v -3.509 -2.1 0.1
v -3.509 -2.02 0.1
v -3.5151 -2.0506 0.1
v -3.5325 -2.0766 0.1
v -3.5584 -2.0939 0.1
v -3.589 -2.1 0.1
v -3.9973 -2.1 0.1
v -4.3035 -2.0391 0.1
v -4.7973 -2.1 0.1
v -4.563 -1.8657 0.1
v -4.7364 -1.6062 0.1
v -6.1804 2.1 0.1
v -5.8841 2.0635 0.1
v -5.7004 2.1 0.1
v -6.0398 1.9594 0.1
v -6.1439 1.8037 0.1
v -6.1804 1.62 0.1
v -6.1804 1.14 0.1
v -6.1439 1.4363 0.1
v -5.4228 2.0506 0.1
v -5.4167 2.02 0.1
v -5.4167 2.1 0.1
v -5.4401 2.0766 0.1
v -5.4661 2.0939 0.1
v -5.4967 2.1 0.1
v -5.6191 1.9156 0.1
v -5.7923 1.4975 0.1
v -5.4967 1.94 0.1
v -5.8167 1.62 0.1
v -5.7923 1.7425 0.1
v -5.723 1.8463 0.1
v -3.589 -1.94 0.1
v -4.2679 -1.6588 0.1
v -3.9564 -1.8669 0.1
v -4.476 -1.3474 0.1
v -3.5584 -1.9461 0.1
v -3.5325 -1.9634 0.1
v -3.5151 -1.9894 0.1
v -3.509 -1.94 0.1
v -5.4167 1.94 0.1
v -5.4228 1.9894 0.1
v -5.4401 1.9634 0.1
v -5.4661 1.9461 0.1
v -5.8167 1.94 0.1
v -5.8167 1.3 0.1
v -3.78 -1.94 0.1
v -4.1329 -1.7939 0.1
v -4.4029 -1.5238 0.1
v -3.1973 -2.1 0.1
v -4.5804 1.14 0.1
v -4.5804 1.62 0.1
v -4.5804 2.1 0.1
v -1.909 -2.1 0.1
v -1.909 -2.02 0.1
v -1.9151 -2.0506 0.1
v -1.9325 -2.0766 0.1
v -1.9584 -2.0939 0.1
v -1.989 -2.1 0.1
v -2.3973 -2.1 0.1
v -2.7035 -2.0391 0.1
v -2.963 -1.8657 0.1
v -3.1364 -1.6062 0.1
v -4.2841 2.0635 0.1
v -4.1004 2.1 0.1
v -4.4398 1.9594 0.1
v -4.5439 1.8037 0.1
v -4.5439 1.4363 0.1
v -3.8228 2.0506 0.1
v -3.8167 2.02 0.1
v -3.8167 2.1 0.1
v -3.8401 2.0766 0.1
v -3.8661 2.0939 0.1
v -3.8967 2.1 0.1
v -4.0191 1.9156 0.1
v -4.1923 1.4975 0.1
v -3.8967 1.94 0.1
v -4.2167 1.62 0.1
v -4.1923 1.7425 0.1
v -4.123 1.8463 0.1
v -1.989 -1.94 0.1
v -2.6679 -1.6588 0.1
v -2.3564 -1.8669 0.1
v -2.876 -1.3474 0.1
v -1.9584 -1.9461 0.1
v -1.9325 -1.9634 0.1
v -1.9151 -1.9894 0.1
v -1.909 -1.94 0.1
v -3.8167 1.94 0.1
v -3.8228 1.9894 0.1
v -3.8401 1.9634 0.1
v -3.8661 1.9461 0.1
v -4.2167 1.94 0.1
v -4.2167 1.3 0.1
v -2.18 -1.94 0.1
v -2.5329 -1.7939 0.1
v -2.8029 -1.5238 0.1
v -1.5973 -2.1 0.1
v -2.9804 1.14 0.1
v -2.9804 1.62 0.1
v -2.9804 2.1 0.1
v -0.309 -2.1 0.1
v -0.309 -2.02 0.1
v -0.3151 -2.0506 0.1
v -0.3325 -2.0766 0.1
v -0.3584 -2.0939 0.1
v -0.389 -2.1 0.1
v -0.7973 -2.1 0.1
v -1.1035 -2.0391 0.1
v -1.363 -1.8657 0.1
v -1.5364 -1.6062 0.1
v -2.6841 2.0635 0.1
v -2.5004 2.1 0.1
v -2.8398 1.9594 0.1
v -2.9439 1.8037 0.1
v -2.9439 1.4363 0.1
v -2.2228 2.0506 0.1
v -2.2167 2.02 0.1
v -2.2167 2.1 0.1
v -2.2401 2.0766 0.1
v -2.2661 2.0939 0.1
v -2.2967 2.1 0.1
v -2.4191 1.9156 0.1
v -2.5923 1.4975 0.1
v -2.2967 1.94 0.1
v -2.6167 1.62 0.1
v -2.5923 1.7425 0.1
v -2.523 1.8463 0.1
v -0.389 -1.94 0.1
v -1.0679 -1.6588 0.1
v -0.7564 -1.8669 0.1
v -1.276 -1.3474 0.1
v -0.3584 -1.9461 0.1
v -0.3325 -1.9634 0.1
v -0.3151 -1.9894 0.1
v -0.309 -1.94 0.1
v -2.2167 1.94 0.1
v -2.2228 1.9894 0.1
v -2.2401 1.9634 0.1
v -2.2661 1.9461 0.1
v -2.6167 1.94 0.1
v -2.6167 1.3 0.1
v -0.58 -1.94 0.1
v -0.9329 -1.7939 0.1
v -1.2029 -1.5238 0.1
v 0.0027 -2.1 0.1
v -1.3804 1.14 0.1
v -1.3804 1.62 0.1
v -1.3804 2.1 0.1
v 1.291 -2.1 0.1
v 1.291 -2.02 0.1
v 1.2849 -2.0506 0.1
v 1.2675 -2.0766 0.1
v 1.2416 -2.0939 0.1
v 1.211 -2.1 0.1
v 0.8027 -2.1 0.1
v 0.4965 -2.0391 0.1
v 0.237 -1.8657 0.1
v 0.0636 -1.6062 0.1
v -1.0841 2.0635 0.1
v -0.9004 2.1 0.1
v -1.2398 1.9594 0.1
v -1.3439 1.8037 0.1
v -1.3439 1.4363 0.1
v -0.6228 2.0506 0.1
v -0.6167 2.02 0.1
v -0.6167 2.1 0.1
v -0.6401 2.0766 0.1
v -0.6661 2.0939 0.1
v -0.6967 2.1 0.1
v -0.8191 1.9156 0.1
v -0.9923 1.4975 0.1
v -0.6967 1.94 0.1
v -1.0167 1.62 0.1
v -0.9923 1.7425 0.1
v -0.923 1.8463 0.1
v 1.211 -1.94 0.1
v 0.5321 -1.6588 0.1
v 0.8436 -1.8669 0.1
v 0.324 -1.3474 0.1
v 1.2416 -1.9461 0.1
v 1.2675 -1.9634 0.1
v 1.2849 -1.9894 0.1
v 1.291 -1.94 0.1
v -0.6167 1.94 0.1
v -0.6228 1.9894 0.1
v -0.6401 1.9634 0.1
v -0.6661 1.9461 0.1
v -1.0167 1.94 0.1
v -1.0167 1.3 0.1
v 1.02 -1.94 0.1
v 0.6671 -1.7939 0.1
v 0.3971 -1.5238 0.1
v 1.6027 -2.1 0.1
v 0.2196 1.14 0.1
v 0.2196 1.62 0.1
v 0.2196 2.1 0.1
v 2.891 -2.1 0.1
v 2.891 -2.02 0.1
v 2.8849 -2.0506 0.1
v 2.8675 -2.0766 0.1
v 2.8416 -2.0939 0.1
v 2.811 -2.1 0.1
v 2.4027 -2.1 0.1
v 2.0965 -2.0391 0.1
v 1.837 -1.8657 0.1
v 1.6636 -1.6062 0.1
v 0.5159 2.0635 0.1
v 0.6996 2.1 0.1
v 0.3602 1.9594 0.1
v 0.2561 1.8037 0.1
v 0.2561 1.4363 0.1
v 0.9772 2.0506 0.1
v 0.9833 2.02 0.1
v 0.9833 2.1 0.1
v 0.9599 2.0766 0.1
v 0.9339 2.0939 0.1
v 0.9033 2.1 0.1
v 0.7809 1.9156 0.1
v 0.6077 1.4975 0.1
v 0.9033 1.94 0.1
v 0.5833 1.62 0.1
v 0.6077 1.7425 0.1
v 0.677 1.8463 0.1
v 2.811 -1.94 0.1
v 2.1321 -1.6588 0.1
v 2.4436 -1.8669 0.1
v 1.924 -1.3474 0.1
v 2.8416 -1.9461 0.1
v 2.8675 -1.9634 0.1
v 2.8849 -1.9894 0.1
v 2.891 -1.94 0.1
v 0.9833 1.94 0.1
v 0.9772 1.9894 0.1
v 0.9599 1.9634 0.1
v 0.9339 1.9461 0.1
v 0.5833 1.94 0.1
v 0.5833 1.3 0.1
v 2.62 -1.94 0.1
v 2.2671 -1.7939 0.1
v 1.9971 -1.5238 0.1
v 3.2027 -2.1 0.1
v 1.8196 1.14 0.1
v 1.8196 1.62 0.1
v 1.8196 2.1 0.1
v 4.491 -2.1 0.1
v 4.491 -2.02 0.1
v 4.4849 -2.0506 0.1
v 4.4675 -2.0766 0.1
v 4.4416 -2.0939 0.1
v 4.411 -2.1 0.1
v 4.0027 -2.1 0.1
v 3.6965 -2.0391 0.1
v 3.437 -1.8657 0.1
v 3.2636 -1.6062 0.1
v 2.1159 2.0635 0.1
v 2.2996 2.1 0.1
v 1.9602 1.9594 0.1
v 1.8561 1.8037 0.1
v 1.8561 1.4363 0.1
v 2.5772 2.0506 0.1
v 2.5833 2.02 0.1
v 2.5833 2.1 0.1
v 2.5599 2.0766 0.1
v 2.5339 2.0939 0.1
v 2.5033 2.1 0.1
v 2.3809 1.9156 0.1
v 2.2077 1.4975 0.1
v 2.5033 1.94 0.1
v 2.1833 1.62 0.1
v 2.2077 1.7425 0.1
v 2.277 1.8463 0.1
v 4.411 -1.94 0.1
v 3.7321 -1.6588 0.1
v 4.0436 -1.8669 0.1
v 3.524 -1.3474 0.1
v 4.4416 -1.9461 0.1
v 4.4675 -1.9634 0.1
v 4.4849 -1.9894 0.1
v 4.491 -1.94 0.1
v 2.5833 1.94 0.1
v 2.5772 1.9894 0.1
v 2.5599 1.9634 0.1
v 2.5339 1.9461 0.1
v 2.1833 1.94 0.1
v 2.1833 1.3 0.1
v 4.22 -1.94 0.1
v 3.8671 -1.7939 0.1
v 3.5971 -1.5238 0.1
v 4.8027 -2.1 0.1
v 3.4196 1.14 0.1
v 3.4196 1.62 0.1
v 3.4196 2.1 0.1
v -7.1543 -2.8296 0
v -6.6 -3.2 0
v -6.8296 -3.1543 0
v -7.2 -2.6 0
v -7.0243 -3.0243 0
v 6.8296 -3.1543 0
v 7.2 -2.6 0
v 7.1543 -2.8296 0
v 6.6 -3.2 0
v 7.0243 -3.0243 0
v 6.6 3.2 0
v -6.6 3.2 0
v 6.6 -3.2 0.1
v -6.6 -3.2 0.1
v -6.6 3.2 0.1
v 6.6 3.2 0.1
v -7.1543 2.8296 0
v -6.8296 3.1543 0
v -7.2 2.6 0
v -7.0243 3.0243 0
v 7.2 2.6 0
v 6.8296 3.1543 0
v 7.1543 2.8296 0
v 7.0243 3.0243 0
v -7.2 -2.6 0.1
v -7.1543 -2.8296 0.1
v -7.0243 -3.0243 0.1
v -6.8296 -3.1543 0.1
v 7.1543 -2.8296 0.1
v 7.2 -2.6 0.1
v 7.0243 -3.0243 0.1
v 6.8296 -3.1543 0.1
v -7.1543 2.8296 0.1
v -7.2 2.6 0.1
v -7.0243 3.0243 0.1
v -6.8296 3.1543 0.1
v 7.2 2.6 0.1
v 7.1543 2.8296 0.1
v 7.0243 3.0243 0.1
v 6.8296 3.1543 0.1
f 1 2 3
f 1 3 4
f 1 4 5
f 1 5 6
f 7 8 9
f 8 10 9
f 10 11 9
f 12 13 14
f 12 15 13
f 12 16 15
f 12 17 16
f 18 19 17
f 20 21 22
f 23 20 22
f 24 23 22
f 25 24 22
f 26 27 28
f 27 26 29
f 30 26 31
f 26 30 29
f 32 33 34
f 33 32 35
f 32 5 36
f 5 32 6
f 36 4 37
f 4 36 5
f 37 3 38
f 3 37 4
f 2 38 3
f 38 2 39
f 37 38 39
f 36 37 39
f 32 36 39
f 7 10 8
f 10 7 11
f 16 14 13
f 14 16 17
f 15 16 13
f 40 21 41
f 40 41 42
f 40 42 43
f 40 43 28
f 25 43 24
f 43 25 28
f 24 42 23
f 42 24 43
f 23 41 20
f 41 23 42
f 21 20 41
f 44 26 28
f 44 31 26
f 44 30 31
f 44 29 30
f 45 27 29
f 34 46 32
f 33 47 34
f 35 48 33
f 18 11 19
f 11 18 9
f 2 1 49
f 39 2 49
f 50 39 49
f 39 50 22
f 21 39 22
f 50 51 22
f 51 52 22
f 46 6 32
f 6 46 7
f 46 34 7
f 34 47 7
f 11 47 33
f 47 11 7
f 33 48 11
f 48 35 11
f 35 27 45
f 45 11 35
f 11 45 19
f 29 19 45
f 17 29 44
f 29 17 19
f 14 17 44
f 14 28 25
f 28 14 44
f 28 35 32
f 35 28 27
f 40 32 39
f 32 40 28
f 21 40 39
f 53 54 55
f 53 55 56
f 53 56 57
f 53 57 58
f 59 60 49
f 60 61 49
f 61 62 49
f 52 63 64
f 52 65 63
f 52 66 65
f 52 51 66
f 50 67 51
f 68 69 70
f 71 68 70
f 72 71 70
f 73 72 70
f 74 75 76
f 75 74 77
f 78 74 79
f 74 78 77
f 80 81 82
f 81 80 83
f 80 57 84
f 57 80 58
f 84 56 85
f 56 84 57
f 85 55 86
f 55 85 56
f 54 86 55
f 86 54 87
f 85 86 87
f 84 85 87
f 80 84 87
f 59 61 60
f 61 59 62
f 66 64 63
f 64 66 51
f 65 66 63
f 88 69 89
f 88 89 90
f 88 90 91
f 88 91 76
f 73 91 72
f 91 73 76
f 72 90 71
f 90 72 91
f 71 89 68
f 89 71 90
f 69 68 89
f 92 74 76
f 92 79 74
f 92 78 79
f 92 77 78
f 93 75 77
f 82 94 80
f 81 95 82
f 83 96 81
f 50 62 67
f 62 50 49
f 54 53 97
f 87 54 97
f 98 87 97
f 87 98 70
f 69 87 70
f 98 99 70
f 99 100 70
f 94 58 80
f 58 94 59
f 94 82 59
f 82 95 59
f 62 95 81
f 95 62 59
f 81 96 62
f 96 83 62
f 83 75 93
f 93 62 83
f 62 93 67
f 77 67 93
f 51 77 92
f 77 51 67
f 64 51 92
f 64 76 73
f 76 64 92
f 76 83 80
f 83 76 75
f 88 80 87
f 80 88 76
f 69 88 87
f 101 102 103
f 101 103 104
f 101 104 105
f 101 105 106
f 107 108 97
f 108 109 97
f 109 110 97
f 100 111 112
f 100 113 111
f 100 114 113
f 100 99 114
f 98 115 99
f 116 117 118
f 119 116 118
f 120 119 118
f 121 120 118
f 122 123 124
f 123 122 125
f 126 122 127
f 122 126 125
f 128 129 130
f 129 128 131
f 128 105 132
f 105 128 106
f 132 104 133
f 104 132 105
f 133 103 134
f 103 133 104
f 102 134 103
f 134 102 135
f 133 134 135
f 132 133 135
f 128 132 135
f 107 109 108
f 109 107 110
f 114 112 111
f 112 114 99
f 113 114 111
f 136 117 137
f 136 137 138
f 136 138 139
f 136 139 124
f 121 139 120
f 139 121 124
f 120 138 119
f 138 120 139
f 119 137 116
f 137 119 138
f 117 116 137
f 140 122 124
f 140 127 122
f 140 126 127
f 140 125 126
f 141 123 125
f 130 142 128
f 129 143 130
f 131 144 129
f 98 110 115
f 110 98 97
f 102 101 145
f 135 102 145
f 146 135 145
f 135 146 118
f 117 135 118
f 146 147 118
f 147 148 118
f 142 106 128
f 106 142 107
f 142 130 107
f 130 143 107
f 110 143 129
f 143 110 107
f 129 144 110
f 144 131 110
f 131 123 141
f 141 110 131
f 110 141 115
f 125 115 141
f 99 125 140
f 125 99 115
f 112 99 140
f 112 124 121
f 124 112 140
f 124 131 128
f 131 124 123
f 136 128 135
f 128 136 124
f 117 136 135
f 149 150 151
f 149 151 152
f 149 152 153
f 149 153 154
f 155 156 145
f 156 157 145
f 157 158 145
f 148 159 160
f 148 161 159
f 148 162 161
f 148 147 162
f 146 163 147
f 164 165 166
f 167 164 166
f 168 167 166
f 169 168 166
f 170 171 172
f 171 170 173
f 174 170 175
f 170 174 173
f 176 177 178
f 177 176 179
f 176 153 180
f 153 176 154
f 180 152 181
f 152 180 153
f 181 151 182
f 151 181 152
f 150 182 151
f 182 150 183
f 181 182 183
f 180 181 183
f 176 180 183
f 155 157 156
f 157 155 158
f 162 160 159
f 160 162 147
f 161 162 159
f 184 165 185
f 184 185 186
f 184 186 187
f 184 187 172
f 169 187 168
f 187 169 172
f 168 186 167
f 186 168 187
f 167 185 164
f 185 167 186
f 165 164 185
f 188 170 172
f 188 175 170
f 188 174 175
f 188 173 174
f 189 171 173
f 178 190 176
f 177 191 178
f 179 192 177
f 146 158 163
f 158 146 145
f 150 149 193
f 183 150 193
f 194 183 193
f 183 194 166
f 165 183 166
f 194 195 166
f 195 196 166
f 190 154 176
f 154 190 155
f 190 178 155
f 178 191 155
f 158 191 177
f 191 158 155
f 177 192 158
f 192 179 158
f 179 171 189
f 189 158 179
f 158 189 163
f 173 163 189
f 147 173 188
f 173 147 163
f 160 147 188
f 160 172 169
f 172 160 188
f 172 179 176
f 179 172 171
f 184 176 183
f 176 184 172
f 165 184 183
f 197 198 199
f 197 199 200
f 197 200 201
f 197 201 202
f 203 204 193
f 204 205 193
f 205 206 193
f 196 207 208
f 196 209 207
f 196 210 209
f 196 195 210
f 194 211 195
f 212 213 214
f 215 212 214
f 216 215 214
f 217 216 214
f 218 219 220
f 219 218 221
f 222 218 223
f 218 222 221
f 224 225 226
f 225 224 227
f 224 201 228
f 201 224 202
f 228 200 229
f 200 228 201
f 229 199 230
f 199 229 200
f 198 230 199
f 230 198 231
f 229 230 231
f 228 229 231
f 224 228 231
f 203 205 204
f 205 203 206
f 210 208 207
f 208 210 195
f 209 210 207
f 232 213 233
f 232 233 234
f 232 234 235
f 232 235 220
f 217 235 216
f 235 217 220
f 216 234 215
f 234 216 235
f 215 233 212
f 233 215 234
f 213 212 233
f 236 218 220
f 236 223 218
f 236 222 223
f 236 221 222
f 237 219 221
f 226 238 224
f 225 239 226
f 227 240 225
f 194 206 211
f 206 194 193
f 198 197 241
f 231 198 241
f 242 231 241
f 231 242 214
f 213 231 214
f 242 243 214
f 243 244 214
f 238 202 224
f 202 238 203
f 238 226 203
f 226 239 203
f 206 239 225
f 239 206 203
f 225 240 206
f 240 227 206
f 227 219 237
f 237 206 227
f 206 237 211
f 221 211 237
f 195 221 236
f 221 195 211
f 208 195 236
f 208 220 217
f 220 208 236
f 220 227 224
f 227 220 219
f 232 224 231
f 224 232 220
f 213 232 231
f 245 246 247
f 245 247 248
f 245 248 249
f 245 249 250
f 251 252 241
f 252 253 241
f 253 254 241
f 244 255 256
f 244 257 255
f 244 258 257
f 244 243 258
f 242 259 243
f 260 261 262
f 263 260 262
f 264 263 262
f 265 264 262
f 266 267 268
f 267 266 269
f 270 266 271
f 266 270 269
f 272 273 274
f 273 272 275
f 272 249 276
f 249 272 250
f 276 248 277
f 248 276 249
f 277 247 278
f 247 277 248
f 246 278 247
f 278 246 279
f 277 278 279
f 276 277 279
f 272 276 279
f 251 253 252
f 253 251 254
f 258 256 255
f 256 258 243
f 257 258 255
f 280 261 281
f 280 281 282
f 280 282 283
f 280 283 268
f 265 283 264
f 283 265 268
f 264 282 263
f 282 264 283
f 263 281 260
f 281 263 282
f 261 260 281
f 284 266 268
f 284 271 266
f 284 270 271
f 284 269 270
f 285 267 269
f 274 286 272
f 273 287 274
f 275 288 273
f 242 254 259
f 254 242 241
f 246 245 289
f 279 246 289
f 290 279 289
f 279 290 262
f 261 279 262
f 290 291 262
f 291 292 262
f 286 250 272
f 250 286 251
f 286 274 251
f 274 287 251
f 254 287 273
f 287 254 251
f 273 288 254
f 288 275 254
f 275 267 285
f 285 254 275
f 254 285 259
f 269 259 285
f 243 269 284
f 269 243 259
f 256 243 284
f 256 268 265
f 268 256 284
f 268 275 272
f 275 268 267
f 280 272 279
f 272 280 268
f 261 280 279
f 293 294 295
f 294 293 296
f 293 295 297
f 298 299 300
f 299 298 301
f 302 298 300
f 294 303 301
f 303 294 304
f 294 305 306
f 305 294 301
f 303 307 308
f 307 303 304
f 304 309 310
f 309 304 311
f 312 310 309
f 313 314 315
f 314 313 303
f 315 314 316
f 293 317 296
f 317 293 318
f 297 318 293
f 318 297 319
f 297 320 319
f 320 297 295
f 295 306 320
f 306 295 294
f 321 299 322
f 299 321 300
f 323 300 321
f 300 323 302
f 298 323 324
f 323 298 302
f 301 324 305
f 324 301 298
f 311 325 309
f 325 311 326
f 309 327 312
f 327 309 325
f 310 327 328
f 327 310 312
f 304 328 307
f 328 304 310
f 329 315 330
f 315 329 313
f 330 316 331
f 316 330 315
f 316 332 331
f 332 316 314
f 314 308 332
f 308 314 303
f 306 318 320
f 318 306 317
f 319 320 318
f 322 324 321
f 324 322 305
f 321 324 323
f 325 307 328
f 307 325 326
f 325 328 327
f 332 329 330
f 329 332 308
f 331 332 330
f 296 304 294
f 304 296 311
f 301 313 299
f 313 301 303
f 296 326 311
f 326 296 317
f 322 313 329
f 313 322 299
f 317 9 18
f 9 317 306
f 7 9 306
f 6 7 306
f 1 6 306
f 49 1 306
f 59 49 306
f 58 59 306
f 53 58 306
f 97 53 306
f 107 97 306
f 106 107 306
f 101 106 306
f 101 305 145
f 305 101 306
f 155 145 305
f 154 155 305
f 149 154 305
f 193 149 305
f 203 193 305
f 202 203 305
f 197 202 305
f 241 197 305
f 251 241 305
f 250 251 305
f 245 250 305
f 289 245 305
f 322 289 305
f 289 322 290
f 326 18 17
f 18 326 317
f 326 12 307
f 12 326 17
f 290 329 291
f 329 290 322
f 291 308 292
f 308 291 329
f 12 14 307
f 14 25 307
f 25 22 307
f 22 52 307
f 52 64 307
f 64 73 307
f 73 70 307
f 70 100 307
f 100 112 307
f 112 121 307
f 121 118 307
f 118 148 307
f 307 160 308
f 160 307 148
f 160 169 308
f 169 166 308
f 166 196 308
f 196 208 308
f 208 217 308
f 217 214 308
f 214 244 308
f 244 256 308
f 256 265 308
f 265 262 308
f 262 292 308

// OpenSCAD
// file: ../p/empty.scad
use <../lib.scad>
function ldraw_lib__empty() = [
// 0 Empty
// 0 Name: empty.dat
// 0 Author: Steffen [Steffen]
// 0 !LDRAW_ORG Primitive UPDATE 2015-01
// 0 !LICENSE Licensed under CC BY 4.0 : see CAreadme.txt
// 
// 0 BFC CERTIFY CCW
  [0,"BFC","CERTIFY"],
  [0,"BFC","CCW"],
// 
// 0 !HISTORY 2015-10-11 [PTadmin] Official Update 2015-01
// 
// 
// 0 // // Tool MLCad cannot handle really empty files. This file is used as a workaround.
// 0 // // It exceptionally contains forbidden non-LDRAW standard syntax to satisfy MLCad until it is fixed OR a different editor has become the de-facto LDRAW standard.
// 0 // // The line being used here is an "impossible" conditional line which never should be visible,
// 0 // // additionally hidden by a syntax explicitly hiding it from displaying.
// 
// 0 // MLCAD HIDE 5 24 0 0 0 0.0001 0 0 0.0001 -0.0001 0 0 0 0
];
module ldraw_lib__empty(step=0, col=false, unit=2/5, alt=false, line=0.2, solid=!$preview)
    makepoly(ldraw_lib__empty(), step=step, col=col, unit=unit, alt=alt, line=line, solid=solid);
ldraw_lib__empty(line=0.2);
// file: ../p/5-16ndis.scad
use <../lib.scad>
function ldraw_lib__5_16ndis() = [
// 0 Disc Negative 0.3125
// 0 Name: 5-16ndis.dat
// 0 Author: Max Martin Richter [MMR1988]
// 0 !LDRAW_ORG Primitive UPDATE 2013-01
// 0 !LICENSE Licensed under CC BY 4.0 : see CAreadme.txt
// 
// 0 BFC CERTIFY CCW
  [0,"BFC","CERTIFY"],
  [0,"BFC","CCW"],
// 
// 0 !HISTORY 2013-07-21 [PTadmin] Official Update 2013-01
// 
// 
// 3 16 1 0 1 0.9239 0 0.3827 1 0 0
  [3,16,1,0,1,0.9239,0,0.3827,1,0,0],
// 3 16 1 0 1 0.7071 0 0.7071 0.9239 0 0.3827
  [3,16,1,0,1,0.7071,0,0.7071,0.9239,0,0.3827],
// 3 16 1 0 1 0.3827 0 0.9239 0.7071 0 0.7071
  [3,16,1,0,1,0.3827,0,0.9239,0.7071,0,0.7071],
// 3 16 1 0 1 0 0 1 0.3827 0 0.9239
  [3,16,1,0,1,0,0,1,0.3827,0,0.9239],
// 3 16 -1 0 1 -0.3827 0 0.9239 0 0 1
  [3,16,-1,0,1,-0.3827,0,0.9239,0,0,1],
// 0 // Build by Primitive Generator 2
];
module ldraw_lib__5_16ndis(step=0, col=false, unit=2/5, alt=false, line=0.2, solid=!$preview)
    makepoly(ldraw_lib__5_16ndis(), step=step, col=col, unit=unit, alt=alt, line=line, solid=solid);
ldraw_lib__5_16ndis(line=0.2);
// file: ../p/5-16chrd.scad
use <../lib.scad>
function ldraw_lib__5_16chrd() = [
// 0 Chord 0.3125
// 0 Name: 5-16chrd.dat
// 0 Author: Niels Karsdorp [nielsk]
// 0 !LDRAW_ORG Primitive UPDATE 2010-01
// 0 !LICENSE Licensed under CC BY 4.0 : see CAreadme.txt
// 
// 0 BFC CERTIFY CCW
  [0,"BFC","CERTIFY"],
  [0,"BFC","CCW"],
// 
// 0 !HISTORY 2010-04-05 [PTadmin] Official Update 2010-01
// 
// 
// 4 16 1 0 0 0.9239 0 0.3827 0 0 1 -0.3827 0 0.9239
  [4,16,1,0,0,0.9239,0,0.3827,0,0,1,-0.3827,0,0.9239],
// 4 16 0.9239 0 0.3827 0.7071 0 0.7071 0.3827 0 0.9239 0 0 1
  [4,16,0.9239,0,0.3827,0.7071,0,0.7071,0.3827,0,0.9239,0,0,1],
// 0
// 
];
module ldraw_lib__5_16chrd(step=0, col=false, unit=2/5, alt=false, line=0.2, solid=!$preview)
    makepoly(ldraw_lib__5_16chrd(), step=step, col=col, unit=unit, alt=alt, line=line, solid=solid);
ldraw_lib__5_16chrd(line=0.2);
// file: ../p/3-16tang.scad
use <../lib.scad>
function ldraw_lib__3_16tang() = [
// 0 Disc Negative Tangent 0.1875
// 0 Name: 3-16tang.dat
// 0 Author: Massimo Maso [Sirio]
// 0 !LDRAW_ORG Primitive UPDATE 2022-03
// 0 !LICENSE Licensed under CC BY 4.0 : see CAreadme.txt
// 
// 0 BFC CERTIFY CCW
  [0,"BFC","CERTIFY"],
  [0,"BFC","CCW"],
// 
// 0 !HISTORY 2022-05-07 [PTadmin] Official Update 2022-03
// 
// 
// 3 16 1 0 0 1 0 0.1989 0.9239 0 0.3827
  [3,16,1,0,0,1,0,0.1989,0.9239,0,0.3827],
// 3 16 0.9239 0 0.3827 0.8478 0 0.5665 0.7071 0 0.7071
  [3,16,0.9239,0,0.3827,0.8478,0,0.5665,0.7071,0,0.7071],
// 3 16 0.7071 0 0.7071 0.5665 0 0.8478 0.3827 0 0.9239
  [3,16,0.7071,0,0.7071,0.5665,0,0.8478,0.3827,0,0.9239],
];
module ldraw_lib__3_16tang(step=0, col=false, unit=2/5, alt=false, line=0.2, solid=!$preview)
    makepoly(ldraw_lib__3_16tang(), step=step, col=col, unit=unit, alt=alt, line=line, solid=solid);
ldraw_lib__3_16tang(line=0.2);
// file: ../p/3-16ndis.scad
use <../lib.scad>
function ldraw_lib__3_16ndis() = [
// 0 Disc Negative 0.1875
// 0 Name: 3-16ndis.dat
// 0 Author: Magnus Forsberg [MagFors]
// 0 !LDRAW_ORG Primitive UPDATE 2024-01
// 0 !LICENSE Licensed under CC BY 4.0 : see CAreadme.txt
// 
// 0 BFC CERTIFY CCW
  [0,"BFC","CERTIFY"],
  [0,"BFC","CCW"],
// 
// 0 !HISTORY 2009-05-02 [PTadmin] Official Update 2009-01
// 0 !HISTORY 2024-01-03 [MagFors] Complete regeneration, original by guyvivan
// 0 !HISTORY 2024-01-29 [OrionP] Official Update 2024-01
// 
// 3 16 1 0 1 0.9239 0 0.3827 1 0 0
  [3,16,1,0,1,0.9239,0,0.3827,1,0,0],
// 3 16 1 0 1 0.7071 0 0.7071 0.9239 0 0.3827
  [3,16,1,0,1,0.7071,0,0.7071,0.9239,0,0.3827],
// 3 16 1 0 1 0.3827 0 0.9239 0.7071 0 0.7071
  [3,16,1,0,1,0.3827,0,0.9239,0.7071,0,0.7071],
// 0 // Build by LDPartEditor (PrimGen 2.X)
];
module ldraw_lib__3_16ndis(step=0, col=false, unit=2/5, alt=false, line=0.2, solid=!$preview)
    makepoly(ldraw_lib__3_16ndis(), step=step, col=col, unit=unit, alt=alt, line=line, solid=solid);
ldraw_lib__3_16ndis(line=0.2);
// file: ../p/3-16chrd.scad
use <../lib.scad>
function ldraw_lib__3_16chrd() = [
// 0 Chord 0.1875
// 0 Name: 3-16chrd.dat
// 0 Author: Niels Karsdorp [nielsk]
// 0 !LDRAW_ORG Primitive UPDATE 2009-01
// 0 !LICENSE Licensed under CC BY 4.0 : see CAreadme.txt
// 
// 0 BFC CERTIFY CCW
  [0,"BFC","CERTIFY"],
  [0,"BFC","CCW"],
// 
// 0 !HISTORY 2009-05-02 [PTadmin] Official Update 2009-01
// 
// 
// 4 16 1 0 0 0.9239 0 0.3827 0.7071 0 0.7071 0.3827 0 0.9239
  [4,16,1,0,0,0.9239,0,0.3827,0.7071,0,0.7071,0.3827,0,0.9239],
// 0
// 
];
module ldraw_lib__3_16chrd(step=0, col=false, unit=2/5, alt=false, line=0.2, solid=!$preview)
    makepoly(ldraw_lib__3_16chrd(), step=step, col=col, unit=unit, alt=alt, line=line, solid=solid);
ldraw_lib__3_16chrd(line=0.2);
// file: ../p/2-4chrd.scad
use <../lib.scad>
function ldraw_lib__2_4chrd() = [
// 0 Chord 0.5
// 0 Name: 2-4chrd.dat
// 0 Author: Philippe Hurbain [Philo]
// 0 !LDRAW_ORG Primitive UPDATE 2014-01
// 0 !LICENSE Licensed under CC BY 4.0 : see CAreadme.txt
// 
// 0 BFC CERTIFY CCW
  [0,"BFC","CERTIFY"],
  [0,"BFC","CCW"],
// 
// 0 !HISTORY 2014-06-21 [PTadmin] Official Update 2014-01
// 
// 
// 4 16 0.9239 0 0.3827 -0.9239 0 0.3827 -1 0 0 1 0 0
  [4,16,0.9239,0,0.3827,-0.9239,0,0.3827,-1,0,0,1,0,0],
// 4 16 0.7071 0 0.7071 -0.7071 0 0.7071 -0.9239 0 0.3827 0.9239 0 0.3827
  [4,16,0.7071,0,0.7071,-0.7071,0,0.7071,-0.9239,0,0.3827,0.9239,0,0.3827],
// 4 16 0.3827 0 0.9239 -0.3827 0 0.9239 -0.7071 0 0.7071 0.7071 0 0.7071
  [4,16,0.3827,0,0.9239,-0.3827,0,0.9239,-0.7071,0,0.7071,0.7071,0,0.7071],
// 3 16 0 0 1 -0.3827 0 0.9239 0.3827 0 0.9239
  [3,16,0,0,1,-0.3827,0,0.9239,0.3827,0,0.9239],
];
module ldraw_lib__2_4chrd(step=0, col=false, unit=2/5, alt=false, line=0.2, solid=!$preview)
    makepoly(ldraw_lib__2_4chrd(), step=step, col=col, unit=unit, alt=alt, line=line, solid=solid);
ldraw_lib__2_4chrd(line=0.2);
// file: ../p/1-4ndis.scad
use <../lib.scad>
function ldraw_lib__1_4ndis() = [
// 0 Disc Negative 0.25
// 0 Name: 1-4ndis.dat
// 0 Author: James Jessiman
// 0 !LDRAW_ORG Primitive UPDATE 2012-01
// 0 !LICENSE Licensed under CC BY 4.0 : see CAreadme.txt
// 
// 0 BFC CERTIFY CCW
  [0,"BFC","CERTIFY"],
  [0,"BFC","CCW"],
// 
// 0 !HISTORY 2002-03-23 [sbliss] Added BFC Statement
// 0 !HISTORY 2002-04-25 [PTadmin] Official Update 2002-02
// 0 !HISTORY 2007-06-22 [PTadmin] Header formatted for Contributor Agreement
// 0 !HISTORY 2008-07-01 [PTadmin] Official Update 2008-01
// 0 !HISTORY 2012-02-16 [Philo] Changed to CCW
// 0 !HISTORY 2012-03-30 [PTadmin] Official Update 2012-01
// 
// 
// 3 16 0.9239 0 0.3827 1 0 0 1 0 1
  [3,16,0.9239,0,0.3827,1,0,0,1,0,1],
// 3 16 0.7071 0 0.7071 0.9239 0 0.3827 1 0 1
  [3,16,0.7071,0,0.7071,0.9239,0,0.3827,1,0,1],
// 3 16 0.3827 0 0.9239 0.7071 0 0.7071 1 0 1
  [3,16,0.3827,0,0.9239,0.7071,0,0.7071,1,0,1],
// 3 16 0 0 1 0.3827 0 0.9239 1 0 1
  [3,16,0,0,1,0.3827,0,0.9239,1,0,1],
];
module ldraw_lib__1_4ndis(step=0, col=false, unit=2/5, alt=false, line=0.2, solid=!$preview)
    makepoly(ldraw_lib__1_4ndis(), step=step, col=col, unit=unit, alt=alt, line=line, solid=solid);
ldraw_lib__1_4ndis(line=0.2);
// file: ../p/1-16chrd.scad
use <../lib.scad>
use <empty.scad>
function ldraw_lib__1_16chrd() = [
// 0 Chord 0.0625
// 0 Name: 1-16chrd.dat
// 0 Author: Philippe Hurbain [Philo]
// 0 !LDRAW_ORG Primitive UPDATE 2015-01
// 0 !LICENSE Licensed under CC BY 4.0 : see CAreadme.txt
// 
// 0 BFC CERTIFY CCW
  [0,"BFC","CERTIFY"],
  [0,"BFC","CCW"],
// 
// 0 !HISTORY 2015-10-11 [PTadmin] Official Update 2015-01
// 
// 
// 0 // This file is intentionally empty because at the current \P resolution,
// 0 // an 1-16chrd is actually empty. However, this file still is present
// 0 // to allow tools to do primitives substition and fill in a real chrd here,
// 0 // or, if desired, to substitute this with the hi-res 48\1-16chrd.
// 
// 0 // This file is based on an idea by Darats at http://forums.ldraw.org/read.php?19,14500,14500#msg-14500
// 
// 1 16 0 0 0 1 0 0 0 1 0 0 0 1 empty.dat
  [1,16,0,0,0,1,0,0,0,1,0,0,0,1, ldraw_lib__empty()],
];
module ldraw_lib__1_16chrd(step=0, col=false, unit=2/5, alt=false, line=0.2, solid=!$preview)
    makepoly(ldraw_lib__1_16chrd(), step=step, col=col, unit=unit, alt=alt, line=line, solid=solid);
ldraw_lib__1_16chrd(line=0.2);
// file: s/6177741ss01.scad
use <../../lib.scad>
use <../../p/1-16chrd.scad>
use <../../p/1-4chrd.scad>
use <../../p/1-4ndis.scad>
use <../../p/2-4chrd.scad>
use <../../p/3-16chrd.scad>
use <../../p/3-16ndis.scad>
use <../../p/3-16tang.scad>
use <../../p/5-16chrd.scad>
use <../../p/5-16ndis.scad>
function ldraw_lib__s__6177741ss01() = [
// 0 ~Sticker  0.8 x  1.8 with Six Black Air Scope on Transparent Background Right - One Opening
// 0 Name: s\6177741ss01.dat
// 0 Author: Massimo Maso [Sirio]
// 0 !LDRAW_ORG Subpart UPDATE 2025-05
// 0 !LICENSE Licensed under CC BY 4.0 : see CAreadme.txt
// 
// 0 BFC CERTIFY CCW
  [0,"BFC","CERTIFY"],
  [0,"BFC","CCW"],
// 
// 0 !HISTORY 2025-05-28 [OrionP] Official Update 2025-05
// 
// 0 // Primitives
// 1 16 3.0274 0 5.05 .2 0 0 0 1 0 0 0 .2 1-4ndis.dat
  [1,16,3.0274,0,5.05,.2,0,0,0,1,0,0,0,.2, ldraw_lib__1_4ndis()],
// 1 16 2.0067 0 3.25 0 0 -2 0 1 0 2 0 0 3-16ndis.dat
  [1,16,2.0067,0,3.25,0,0,-2,0,1,0,2,0,0, ldraw_lib__3_16ndis()],
// 1 16 -2.251 0 -4.05 0 0 -1.2 0 1 0 -1.2 0 0 5-16ndis.dat
  [1,16,-2.251,0,-4.05,0,0,-1.2,0,1,0,-1.2,0,0, ldraw_lib__5_16ndis()],
// 1 16 -1.7417 0 -5.05 .2 0 0 0 1 0 0 0 -.2 1-4ndis.dat
  [1,16,-1.7417,0,-5.05,.2,0,0,0,1,0,0,0,-.2, ldraw_lib__1_4ndis()],
// 0 BFC NOCLIP
  [0,"BFC","NOCLIP"],
// 1 72 -1.7417 0 -4.05 0 0 -.8 0 1 0 -.8 0 0 5-16chrd.dat
  [1,72,-1.7417,0,-4.05,0,0,-.8,0,1,0,-.8,0,0, ldraw_lib__5_16chrd()],
// 1 72 3.0274 0 2.45 0 0 -2.4 0 1 0 2.4 0 0 3-16chrd.dat
  [1,72,3.0274,0,2.45,0,0,-2.4,0,1,0,2.4,0,0, ldraw_lib__3_16chrd()],
// 1 0 3.0274 0 5.05 0 0 .2 0 1 0 .2 0 0 2-4chrd.dat
  [1,0,3.0274,0,5.05,0,0,.2,0,1,0,.2,0,0, ldraw_lib__2_4chrd()],
// 1 71 3.0274 0 5.05 .2 0 0 0 1 0 0 0 -.2 1-4ndis.dat
  [1,71,3.0274,0,5.05,.2,0,0,0,1,0,0,0,-.2, ldraw_lib__1_4ndis()],
// 1 0 2.0067 0 3.25 0 0 -2 0 1 0 2 0 0 3-16chrd.dat
  [1,0,2.0067,0,3.25,0,0,-2,0,1,0,2,0,0, ldraw_lib__3_16chrd()],
// 1 0 -2.251 0 -4.05 -1.2 0 0 0 1 0 0 0 1.2 1-16chrd.dat
  [1,0,-2.251,0,-4.05,-1.2,0,0,0,1,0,0,0,1.2, ldraw_lib__1_16chrd()],
// 1 0 -2.251 0 -4.05 0 0 -1.2 0 1 0 -1.2 0 0 1-4chrd.dat
  [1,0,-2.251,0,-4.05,0,0,-1.2,0,1,0,-1.2,0,0, ldraw_lib__1_4chrd()],
// 1 71 -1.7417 0 -5.05 .2 0 0 0 1 0 0 0 .2 1-4ndis.dat
  [1,71,-1.7417,0,-5.05,.2,0,0,0,1,0,0,0,.2, ldraw_lib__1_4ndis()],
// 1 0 -1.7417 0 -5.05 0 0 .2 0 1 0 .2 0 0 2-4chrd.dat
  [1,0,-1.7417,0,-5.05,0,0,.2,0,1,0,.2,0,0, ldraw_lib__2_4chrd()],
// 1 0 -1.7417 0 -4.05 0 0 -.8 0 1 0 -.8 0 0 5-16ndis.dat
  [1,0,-1.7417,0,-4.05,0,0,-.8,0,1,0,-.8,0,0, ldraw_lib__5_16ndis()],
// 1 0 3.0274 0 2.45 0 0 -2.4 0 1 0 2.4 0 0 3-16tang.dat
  [1,0,3.0274,0,2.45,0,0,-2.4,0,1,0,2.4,0,0, ldraw_lib__3_16tang()],
// 0 BFC CLIP
  [0,"BFC","CLIP"],
// 0 // Trasparent faces
// 4 16 .0067 0 5.25 -3.451 0 -2.85 -3.35968 0 -3.59076 .1589 0 4.0154
  [4,16,.0067,0,5.25,-3.451,0,-2.85,-3.35968,0,-3.59076,.1589,0,4.0154],
// 3 16 4.0067 0 5.25 3.2274 0 5.25 3.2274 0 5.05
  [3,16,4.0067,0,5.25,3.2274,0,5.25,3.2274,0,5.05],
// 3 16 4.0067 0 5.25 3.2274 0 5.05 3.2274 0 4.85
  [3,16,4.0067,0,5.25,3.2274,0,5.05,3.2274,0,4.85],
// 4 16 4.0067 0 5.25 3.2274 0 4.85 -1.5417 0 -5.25 .549 0 -2.85
  [4,16,4.0067,0,5.25,3.2274,0,4.85,-1.5417,0,-5.25,.549,0,-2.85],
// 3 16 -1.5417 0 -5.25 3.2274 0 4.85 -1.5417 0 -5.05
  [3,16,-1.5417,0,-5.25,3.2274,0,4.85,-1.5417,0,-5.05],
// 3 16 -1.5417 0 -5.25 .549 0 -4.05 .549 0 -2.85
  [3,16,-1.5417,0,-5.25,.549,0,-4.05,.549,0,-2.85],
// 3 16 -1.5417 0 -5.25 .549 0 -5.25 .549 0 -4.05
  [3,16,-1.5417,0,-5.25,.549,0,-5.25,.549,0,-4.05],
// 0 BFC NOCLIP
  [0,"BFC","NOCLIP"],
// 0 // Black faces
// 4 0 2.0067 0 5.25 2.55004 0 4.85 3.0274 0 4.85 3.0274 0 5.25
  [4,0,2.0067,0,5.25,2.55004,0,4.85,3.0274,0,4.85,3.0274,0,5.25],
// 3 0 2.0067 0 5.25 2.10892 0 4.66736 2.55004 0 4.85
  [3,0,2.0067,0,5.25,2.10892,0,4.66736,2.55004,0,4.85],
// 3 0 2.0067 0 5.25 1.6678 0 4.48472 2.10892 0 4.66736
  [3,0,2.0067,0,5.25,1.6678,0,4.48472,2.10892,0,4.66736],
// 4 0 2.0067 0 5.25 .1589 0 4.0154 1.33036 0 4.14704 1.6678 0 4.48472
  [4,0,2.0067,0,5.25,.1589,0,4.0154,1.33036,0,4.14704,1.6678,0,4.48472],
// 3 0 .1589 0 4.0154 .99268 0 3.8096 1.33036 0 4.14704
  [3,0,.1589,0,4.0154,.99268,0,3.8096,1.33036,0,4.14704],
// 3 0 .1589 0 4.0154 .81004 0 3.36848 .99268 0 3.8096
  [3,0,.1589,0,4.0154,.81004,0,3.36848,.99268,0,3.8096],
// 3 0 -2.5417 0 -3.25 -2.48082 0 -3.74384 .81004 0 3.36848
  [3,0,-2.5417,0,-3.25,-2.48082,0,-3.74384,.81004,0,3.36848],
// 4 0 -2.5417 0 -3.25 .81004 0 3.36848 .1589 0 4.0154 -3.35968 0 -3.59076
  [4,0,-2.5417,0,-3.25,.81004,0,3.36848,.1589,0,4.0154,-3.35968,0,-3.59076],
// 3 0 -2.5417 0 -3.25 -3.35968 0 -3.59076 -2.5417 0 -4.05
  [3,0,-2.5417,0,-3.25,-3.35968,0,-3.59076,-2.5417,0,-4.05],
// 4 0 -2.5417 0 -4.85 -2.5417 0 -4.05 -3.35968 0 -3.59076 -3.451 0 -4.05
  [4,0,-2.5417,0,-4.85,-2.5417,0,-4.05,-3.35968,0,-3.59076,-3.451,0,-4.05],
// 3 0 -2.5417 0 -4.85 -3.451 0 -4.05 -2.251 0 -5.25
  [3,0,-2.5417,0,-4.85,-3.451,0,-4.05,-2.251,0,-5.25],
// 4 0 -2.5417 0 -4.85 -2.251 0 -5.25 -1.7417 0 -5.25 -1.7417 0 -4.85
  [4,0,-2.5417,0,-4.85,-2.251,0,-5.25,-1.7417,0,-5.25,-1.7417,0,-4.85],
// 0 // Halftone faces (actually 16 ndis and 0 disc)
// 4 72 3.0274 0 4.85 .81004 0 3.36848 -2.48082 0 -3.74384 -1.7417 0 -4.85
  [4,72,3.0274,0,4.85,.81004,0,3.36848,-2.48082,0,-3.74384,-1.7417,0,-4.85],
// 4 71 3.2274 0 4.85 3.0274 0 4.85 -1.7417 0 -4.85 -1.5417 0 -4.85
  [4,71,3.2274,0,4.85,3.0274,0,4.85,-1.7417,0,-4.85,-1.5417,0,-4.85],
// 3 71 3.2274 0 4.85 -1.5417 0 -4.85 -1.5417 0 -5.05
  [3,71,3.2274,0,4.85,-1.5417,0,-4.85,-1.5417,0,-5.05],
];
module ldraw_lib__s__6177741ss01(step=0, col=false, unit=2/5, alt=false, line=0.2, solid=!$preview)
    makepoly(ldraw_lib__s__6177741ss01(), step=step, col=col, unit=unit, alt=alt, line=line, solid=solid);
ldraw_lib__s__6177741ss01(line=0.2);
// file: ../p/box3u12.scad
use <../lib.scad>
function ldraw_lib__box3u12() = [
// 0 Box with 3 Parallel Faces without Any Edges
// 0 Name: box3u12.dat
// 0 Author: J.C. Tchang [tchang]
// 0 !LDRAW_ORG Primitive UPDATE 2014-02
// 0 !LICENSE Licensed under CC BY 4.0 : see CAreadme.txt
// 
// 0 BFC CERTIFY CCW
  [0,"BFC","CERTIFY"],
  [0,"BFC","CCW"],
// 
// 0 !HISTORY 2014-12-23 [PTadmin] Official Update 2014-02
// 
// 
// 4 16 -1 1 1 1 1 1 1 1 -1 -1 1 -1
  [4,16,-1,1,1,1,1,1,1,1,-1,-1,1,-1],
// 4 16 -1 1 1 -1 0 1 1 0 1 1 1 1
  [4,16,-1,1,1,-1,0,1,1,0,1,1,1,1],
// 4 16 1 1 -1 1 0 -1 -1 0 -1 -1 1 -1
  [4,16,1,1,-1,1,0,-1,-1,0,-1,-1,1,-1],
];
module ldraw_lib__box3u12(step=0, col=false, unit=2/5, alt=false, line=0.2, solid=!$preview)
    makepoly(ldraw_lib__box3u12(), step=step, col=col, unit=unit, alt=alt, line=line, solid=solid);
ldraw_lib__box3u12(line=0.2);
// file: ../p/1-4cyli.scad
use <../lib.scad>
function ldraw_lib__1_4cyli() = [
// 0 Cylinder 0.25
// 0 Name: 1-4cyli.dat
// 0 Author: James Jessiman
// 0 !LDRAW_ORG Primitive UPDATE 2012-01
// 0 !LICENSE Licensed under CC BY 4.0 : see CAreadme.txt
// 
// 0 BFC CERTIFY CCW
  [0,"BFC","CERTIFY"],
  [0,"BFC","CCW"],
// 
// 0 !HISTORY 2002-03-23 [sbliss] Added BFC statement.
// 0 !HISTORY 2002-04-25 [PTadmin] Official Update 2002-02
// 0 !HISTORY 2007-06-22 [PTadmin] Header formatted for Contributor Agreement
// 0 !HISTORY 2008-07-01 [PTadmin] Official Update 2008-01
// 0 !HISTORY 2012-02-16 [Philo] Changed to CCW
// 0 !HISTORY 2012-03-30 [PTadmin] Official Update 2012-01
// 
// 
// 4 16 1 1 0 0.9239 1 0.3827 0.9239 0 0.3827 1 0 0
  [4,16,1,1,0,0.9239,1,0.3827,0.9239,0,0.3827,1,0,0],
// 5 24 1 0 0 1 1 0 0.9239 0 0.3827 1 0 -1
  [5,24,1,0,0,1,1,0,0.9239,0,0.3827,1,0,-1],
// 4 16 0.9239 1 0.3827 0.7071 1 0.7071 0.7071 0 0.7071 0.9239 0 0.3827
  [4,16,0.9239,1,0.3827,0.7071,1,0.7071,0.7071,0,0.7071,0.9239,0,0.3827],
// 5 24 0.9239 0 0.3827 0.9239 1 0.3827 0.7071 0 0.7071 1 0 0
  [5,24,0.9239,0,0.3827,0.9239,1,0.3827,0.7071,0,0.7071,1,0,0],
// 4 16 0.7071 1 0.7071 0.3827 1 0.9239 0.3827 0 0.9239 0.7071 0 0.7071
  [4,16,0.7071,1,0.7071,0.3827,1,0.9239,0.3827,0,0.9239,0.7071,0,0.7071],
// 5 24 0.7071 0 0.7071 0.7071 1 0.7071 0.3827 0 0.9239 0.9239 0 0.3827
  [5,24,0.7071,0,0.7071,0.7071,1,0.7071,0.3827,0,0.9239,0.9239,0,0.3827],
// 4 16 0.3827 1 0.9239 0 1 1 0 0 1 0.3827 0 0.9239
  [4,16,0.3827,1,0.9239,0,1,1,0,0,1,0.3827,0,0.9239],
// 5 24 0.3827 0 0.9239 0.3827 1 0.9239 0 0 1 0.7071 0 0.7071
  [5,24,0.3827,0,0.9239,0.3827,1,0.9239,0,0,1,0.7071,0,0.7071],
// 5 24 0 0 1 0 1 1 0.3827 0 0.9239 -1 0 1
  [5,24,0,0,1,0,1,1,0.3827,0,0.9239,-1,0,1],
];
module ldraw_lib__1_4cyli(step=0, col=false, unit=2/5, alt=false, line=0.2, solid=!$preview)
    makepoly(ldraw_lib__1_4cyli(), step=step, col=col, unit=unit, alt=alt, line=line, solid=solid);
ldraw_lib__1_4cyli(line=0.2);
// file: ../p/1-4chrd.scad
use <../lib.scad>
function ldraw_lib__1_4chrd() = [
// 0 Chord 0.25
// 0 Name: 1-4chrd.dat
// 0 Author: Max Martin Richter [MMR1988]
// 0 !LDRAW_ORG Primitive UPDATE 2023-05
// 0 !LICENSE Licensed under CC BY 4.0 : see CAreadme.txt
// 
// 0 BFC CERTIFY CCW
  [0,"BFC","CERTIFY"],
  [0,"BFC","CCW"],
// 
// 0 !HISTORY 2004-04-22 [PTadmin] Official Update 2004-02
// 0 !HISTORY 2007-10-09 [PTadmin] Header formatted for Contributor Agreement
// 0 !HISTORY 2008-07-01 [PTadmin] Official Update 2008-01
// 0 !HISTORY 2012-08-02 [MMR1988] Re-creation with PrimGen2 and Rectifier
// 0 !HISTORY 2012-08-09 [PTadmin] Official Update 2012-02
// 0 !HISTORY 2023-10-27 [OrionP] Change author to MMR1988 from hafhead
// 0 !HISTORY 2023-10-31 [OrionP] Official Update 2023-05
// 
// 4 16 0.9239 0 0.3827 0.3827 0 0.9239 0 0 1 1 0 0
  [4,16,0.9239,0,0.3827,0.3827,0,0.9239,0,0,1,1,0,0],
// 3 16 0.7071 0 0.7071 0.3827 0 0.9239 0.9239 0 0.3827
  [3,16,0.7071,0,0.7071,0.3827,0,0.9239,0.9239,0,0.3827],
];
module ldraw_lib__1_4chrd(step=0, col=false, unit=2/5, alt=false, line=0.2, solid=!$preview)
    makepoly(ldraw_lib__1_4chrd(), step=step, col=col, unit=unit, alt=alt, line=line, solid=solid);
ldraw_lib__1_4chrd(line=0.2);
// main file
use <../lib.scad>
use <6177741s.scad>
function ldraw_lib__6177741t() = [
// 0 Sticker  0.8 x  1.8 with Six Black Air Scope on Transparent Background Left
// 0 Name: 6177741t.dat
// 0 Author: Massimo Maso [Sirio]
// 0 !LDRAW_ORG Part UPDATE 2025-05
// 0 !LICENSE Licensed under CC BY 4.0 : see CAreadme.txt
// 
// 0 BFC CERTIFY CCW
  [0,"BFC","CERTIFY"],
  [0,"BFC","CCW"],
// 
// 0 !KEYWORDS AMG, GT3, Mercedes, Set 75877, Speed Champions
// 
// 0 !HISTORY 2025-05-28 [OrionP] Official Update 2025-05
// 
// 
// 1 16 0 0 0 1 0 0 0 1 0 0 0 -1 6177741s.dat
  [1,16,0,0,0,1,0,0,0,1,0,0,0,-1, ldraw_lib__6177741s()],
];
module ldraw_lib__6177741t(step=0, col=false, unit=2/5, alt=false, line=0.2, solid=!$preview)
    makepoly(ldraw_lib__6177741t(), step=step, col=col, unit=unit, alt=alt, line=line, solid=solid);
ldraw_lib__6177741t(line=0.2);
